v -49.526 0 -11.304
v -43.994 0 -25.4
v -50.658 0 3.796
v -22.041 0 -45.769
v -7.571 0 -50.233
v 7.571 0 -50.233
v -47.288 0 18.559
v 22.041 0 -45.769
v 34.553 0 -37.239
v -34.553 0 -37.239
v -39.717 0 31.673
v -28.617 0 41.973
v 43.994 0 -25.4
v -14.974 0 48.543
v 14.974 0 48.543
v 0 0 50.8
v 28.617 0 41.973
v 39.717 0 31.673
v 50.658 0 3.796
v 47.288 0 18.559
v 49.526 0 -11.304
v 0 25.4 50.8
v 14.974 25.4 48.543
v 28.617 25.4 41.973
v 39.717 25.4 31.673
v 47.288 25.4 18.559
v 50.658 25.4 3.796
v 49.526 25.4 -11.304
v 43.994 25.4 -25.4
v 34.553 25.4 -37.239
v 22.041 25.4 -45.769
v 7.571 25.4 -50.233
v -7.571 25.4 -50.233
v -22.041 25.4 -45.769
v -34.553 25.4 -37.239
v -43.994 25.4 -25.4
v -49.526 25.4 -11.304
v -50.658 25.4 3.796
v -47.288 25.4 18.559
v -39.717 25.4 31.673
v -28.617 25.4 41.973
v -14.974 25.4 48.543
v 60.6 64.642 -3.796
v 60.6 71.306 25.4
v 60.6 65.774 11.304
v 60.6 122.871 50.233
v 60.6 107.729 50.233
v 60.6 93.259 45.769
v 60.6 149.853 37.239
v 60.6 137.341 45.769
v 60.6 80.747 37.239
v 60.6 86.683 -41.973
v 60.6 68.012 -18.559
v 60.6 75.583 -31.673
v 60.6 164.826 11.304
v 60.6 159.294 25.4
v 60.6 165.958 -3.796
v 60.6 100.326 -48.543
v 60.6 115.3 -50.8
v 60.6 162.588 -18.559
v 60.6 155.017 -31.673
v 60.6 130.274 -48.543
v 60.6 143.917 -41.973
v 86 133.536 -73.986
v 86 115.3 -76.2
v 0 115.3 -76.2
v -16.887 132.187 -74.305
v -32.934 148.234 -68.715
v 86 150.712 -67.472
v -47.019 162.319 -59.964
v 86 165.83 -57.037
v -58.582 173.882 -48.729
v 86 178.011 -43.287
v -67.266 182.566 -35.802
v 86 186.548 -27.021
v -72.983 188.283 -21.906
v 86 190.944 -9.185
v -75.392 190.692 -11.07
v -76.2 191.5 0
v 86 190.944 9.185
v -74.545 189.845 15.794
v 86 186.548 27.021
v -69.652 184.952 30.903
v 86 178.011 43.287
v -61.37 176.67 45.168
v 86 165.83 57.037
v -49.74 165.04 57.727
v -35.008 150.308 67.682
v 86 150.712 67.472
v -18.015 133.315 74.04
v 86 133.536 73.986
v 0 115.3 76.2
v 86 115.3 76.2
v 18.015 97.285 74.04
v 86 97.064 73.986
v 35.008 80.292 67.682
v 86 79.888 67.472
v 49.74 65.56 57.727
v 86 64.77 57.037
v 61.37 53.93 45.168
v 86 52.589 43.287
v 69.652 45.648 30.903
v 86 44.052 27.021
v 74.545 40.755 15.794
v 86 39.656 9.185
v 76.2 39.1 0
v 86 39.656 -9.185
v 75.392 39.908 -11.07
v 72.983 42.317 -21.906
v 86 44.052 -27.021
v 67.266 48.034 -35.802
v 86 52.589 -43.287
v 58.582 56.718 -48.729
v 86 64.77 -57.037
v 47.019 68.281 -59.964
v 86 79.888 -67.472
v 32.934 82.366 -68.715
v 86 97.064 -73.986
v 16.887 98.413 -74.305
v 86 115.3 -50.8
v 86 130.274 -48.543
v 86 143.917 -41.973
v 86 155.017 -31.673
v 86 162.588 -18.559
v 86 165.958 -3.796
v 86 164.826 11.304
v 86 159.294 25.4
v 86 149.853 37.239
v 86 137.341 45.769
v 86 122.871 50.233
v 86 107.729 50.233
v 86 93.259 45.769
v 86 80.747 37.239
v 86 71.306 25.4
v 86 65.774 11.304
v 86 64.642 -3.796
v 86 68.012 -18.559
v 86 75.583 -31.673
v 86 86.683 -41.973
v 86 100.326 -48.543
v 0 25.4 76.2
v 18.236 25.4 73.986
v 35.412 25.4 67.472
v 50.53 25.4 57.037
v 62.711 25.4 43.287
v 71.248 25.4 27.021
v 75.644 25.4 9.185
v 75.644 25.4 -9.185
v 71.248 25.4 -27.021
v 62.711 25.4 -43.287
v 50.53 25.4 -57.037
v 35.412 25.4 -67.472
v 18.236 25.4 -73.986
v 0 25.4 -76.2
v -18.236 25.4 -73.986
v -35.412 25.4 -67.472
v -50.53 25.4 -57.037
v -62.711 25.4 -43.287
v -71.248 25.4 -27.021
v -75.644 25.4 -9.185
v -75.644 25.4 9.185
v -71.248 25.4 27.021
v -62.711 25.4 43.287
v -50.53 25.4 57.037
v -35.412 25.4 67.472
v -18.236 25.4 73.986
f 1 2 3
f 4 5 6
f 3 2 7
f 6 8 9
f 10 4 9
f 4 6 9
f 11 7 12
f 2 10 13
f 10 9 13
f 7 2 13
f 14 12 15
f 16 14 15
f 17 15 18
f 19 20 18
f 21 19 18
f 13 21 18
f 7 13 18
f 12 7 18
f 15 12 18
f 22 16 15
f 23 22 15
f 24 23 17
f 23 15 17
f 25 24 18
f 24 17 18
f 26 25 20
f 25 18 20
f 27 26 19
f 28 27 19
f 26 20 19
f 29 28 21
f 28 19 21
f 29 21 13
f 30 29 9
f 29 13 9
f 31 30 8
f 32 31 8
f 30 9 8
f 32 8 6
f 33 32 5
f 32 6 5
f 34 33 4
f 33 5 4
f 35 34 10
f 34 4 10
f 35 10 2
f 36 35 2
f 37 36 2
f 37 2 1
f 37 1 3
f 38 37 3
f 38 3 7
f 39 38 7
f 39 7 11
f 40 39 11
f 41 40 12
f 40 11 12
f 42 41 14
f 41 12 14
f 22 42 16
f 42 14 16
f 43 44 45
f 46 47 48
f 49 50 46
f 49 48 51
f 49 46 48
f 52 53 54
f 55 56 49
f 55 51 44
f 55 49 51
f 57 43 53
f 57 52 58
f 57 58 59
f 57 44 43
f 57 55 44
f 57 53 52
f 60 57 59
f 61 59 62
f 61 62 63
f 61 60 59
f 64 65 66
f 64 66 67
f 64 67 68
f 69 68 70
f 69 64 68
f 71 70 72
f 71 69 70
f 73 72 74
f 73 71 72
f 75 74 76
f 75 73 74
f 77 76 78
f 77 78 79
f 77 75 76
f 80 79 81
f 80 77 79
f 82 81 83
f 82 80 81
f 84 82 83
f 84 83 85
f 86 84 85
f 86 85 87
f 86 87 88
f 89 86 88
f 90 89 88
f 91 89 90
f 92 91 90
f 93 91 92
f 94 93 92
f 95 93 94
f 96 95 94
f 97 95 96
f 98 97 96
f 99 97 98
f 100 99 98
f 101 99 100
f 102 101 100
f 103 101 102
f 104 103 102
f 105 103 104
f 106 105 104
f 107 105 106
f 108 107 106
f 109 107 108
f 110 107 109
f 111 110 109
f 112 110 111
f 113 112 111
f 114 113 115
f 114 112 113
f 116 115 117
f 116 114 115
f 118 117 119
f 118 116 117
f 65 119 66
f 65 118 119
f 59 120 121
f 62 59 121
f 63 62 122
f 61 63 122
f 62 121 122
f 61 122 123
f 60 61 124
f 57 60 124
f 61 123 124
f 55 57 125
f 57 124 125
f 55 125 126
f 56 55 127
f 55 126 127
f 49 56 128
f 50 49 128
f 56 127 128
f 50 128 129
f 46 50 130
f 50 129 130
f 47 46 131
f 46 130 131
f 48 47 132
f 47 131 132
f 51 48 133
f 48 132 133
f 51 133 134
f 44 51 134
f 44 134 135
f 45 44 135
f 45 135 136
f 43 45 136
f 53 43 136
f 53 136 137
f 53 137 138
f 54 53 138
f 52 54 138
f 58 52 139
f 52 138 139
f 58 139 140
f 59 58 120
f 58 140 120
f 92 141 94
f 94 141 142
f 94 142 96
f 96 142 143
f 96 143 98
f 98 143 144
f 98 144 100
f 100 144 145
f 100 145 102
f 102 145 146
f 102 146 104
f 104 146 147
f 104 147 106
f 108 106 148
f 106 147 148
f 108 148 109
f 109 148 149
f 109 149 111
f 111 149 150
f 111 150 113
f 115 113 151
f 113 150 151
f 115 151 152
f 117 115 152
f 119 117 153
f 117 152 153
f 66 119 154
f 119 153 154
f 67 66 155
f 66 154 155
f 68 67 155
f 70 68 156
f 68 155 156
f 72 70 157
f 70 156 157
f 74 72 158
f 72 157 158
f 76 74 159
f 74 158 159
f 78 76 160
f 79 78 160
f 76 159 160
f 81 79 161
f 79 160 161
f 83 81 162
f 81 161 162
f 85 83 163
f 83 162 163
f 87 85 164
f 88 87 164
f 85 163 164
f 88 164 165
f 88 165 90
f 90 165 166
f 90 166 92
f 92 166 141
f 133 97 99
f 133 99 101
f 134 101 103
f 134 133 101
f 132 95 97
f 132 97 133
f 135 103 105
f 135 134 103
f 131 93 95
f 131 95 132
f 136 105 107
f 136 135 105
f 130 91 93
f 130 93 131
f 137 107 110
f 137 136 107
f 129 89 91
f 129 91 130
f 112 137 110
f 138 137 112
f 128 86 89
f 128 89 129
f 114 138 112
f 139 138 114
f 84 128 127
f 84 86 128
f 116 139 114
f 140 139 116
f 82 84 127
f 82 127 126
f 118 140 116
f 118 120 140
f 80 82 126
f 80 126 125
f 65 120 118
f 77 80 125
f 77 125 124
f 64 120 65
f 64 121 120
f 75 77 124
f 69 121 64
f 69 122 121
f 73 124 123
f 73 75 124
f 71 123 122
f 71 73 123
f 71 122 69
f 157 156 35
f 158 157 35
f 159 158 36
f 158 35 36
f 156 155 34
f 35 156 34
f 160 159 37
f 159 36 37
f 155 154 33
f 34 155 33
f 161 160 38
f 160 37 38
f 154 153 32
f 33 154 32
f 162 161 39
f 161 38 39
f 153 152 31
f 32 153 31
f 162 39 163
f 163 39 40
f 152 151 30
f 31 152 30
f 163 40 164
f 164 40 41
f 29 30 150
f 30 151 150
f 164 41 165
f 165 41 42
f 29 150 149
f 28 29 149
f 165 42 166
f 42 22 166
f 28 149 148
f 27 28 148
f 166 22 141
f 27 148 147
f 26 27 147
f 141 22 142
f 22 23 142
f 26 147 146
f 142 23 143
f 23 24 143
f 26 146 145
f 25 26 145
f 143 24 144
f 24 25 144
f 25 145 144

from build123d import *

# Parameters (mm, degrees)
SKETCH1_R           = 50.8
BOSS_EXTRUDE1_DEPTH = 25.4
SKETCH2_R           = 76.2
BOSS_EXTRUDE2_DEPTH = 89.9
SKETCH4_R           = 76.2
BOSS_EXTRUDE3_DEPTH = 86
CUT_EXTRUDE1_DEPTH  = 202.96942838
SKETCH7_R           = 50.8
CUT_EXTRUDE2_DEPTH  = 25.4


with BuildPart() as part:
    # Sketch1 → Boss-Extrude1 (new body)
    with BuildSketch(Plane(origin=(0, 0, 0), x_dir=(1, 0, 0), z_dir=(0, 1, 0))):
        Circle(SKETCH1_R)
    extrude(amount=BOSS_EXTRUDE1_DEPTH)

    # Sketch2 → Boss-Extrude2 (add)
    with BuildSketch(Plane(origin=(0, 25.4, 0), x_dir=(1, 0, 0), z_dir=(0, 1, 0))):
        Circle(SKETCH2_R)
    extrude(amount=BOSS_EXTRUDE2_DEPTH)

    # Sketch4 → Boss-Extrude3 (add, symmetric)
    with BuildSketch(Plane(origin=(0, 0, 0), x_dir=(0, 0, -1), z_dir=(1, 0, 0))):
        with Locations((0, 115.3)):
            Circle(SKETCH4_R)
    extrude(amount=BOSS_EXTRUDE3_DEPTH, both=True)

    # Sketch5 → Cut-Extrude1 (cut, through all)
    with BuildSketch(Plane.XZ.offset(-25.4)):
        with BuildLine():
            Line((0, 76.2), (0, 148.473309088))
            ThreePointArc((0, 148.473309088), (-148.473309088, 0), (0, -148.473309088))
            Line((0, -148.473309088), (0, -76.2))
            ThreePointArc((0, -76.2), (-76.2, 0), (0, 76.2))
        make_face()
    extrude(amount=-CUT_EXTRUDE1_DEPTH, mode=Mode.SUBTRACT)

    # Sketch7 → Cut-Extrude2 (cut)
    with BuildSketch(Plane(origin=(86, 0, 0), x_dir=(0, 0, -1), z_dir=(1, 0, 0))):
        with Locations((0, 115.3)):
            Circle(SKETCH7_R)
    extrude(amount=-CUT_EXTRUDE2_DEPTH, mode=Mode.SUBTRACT)


solid = part.part
